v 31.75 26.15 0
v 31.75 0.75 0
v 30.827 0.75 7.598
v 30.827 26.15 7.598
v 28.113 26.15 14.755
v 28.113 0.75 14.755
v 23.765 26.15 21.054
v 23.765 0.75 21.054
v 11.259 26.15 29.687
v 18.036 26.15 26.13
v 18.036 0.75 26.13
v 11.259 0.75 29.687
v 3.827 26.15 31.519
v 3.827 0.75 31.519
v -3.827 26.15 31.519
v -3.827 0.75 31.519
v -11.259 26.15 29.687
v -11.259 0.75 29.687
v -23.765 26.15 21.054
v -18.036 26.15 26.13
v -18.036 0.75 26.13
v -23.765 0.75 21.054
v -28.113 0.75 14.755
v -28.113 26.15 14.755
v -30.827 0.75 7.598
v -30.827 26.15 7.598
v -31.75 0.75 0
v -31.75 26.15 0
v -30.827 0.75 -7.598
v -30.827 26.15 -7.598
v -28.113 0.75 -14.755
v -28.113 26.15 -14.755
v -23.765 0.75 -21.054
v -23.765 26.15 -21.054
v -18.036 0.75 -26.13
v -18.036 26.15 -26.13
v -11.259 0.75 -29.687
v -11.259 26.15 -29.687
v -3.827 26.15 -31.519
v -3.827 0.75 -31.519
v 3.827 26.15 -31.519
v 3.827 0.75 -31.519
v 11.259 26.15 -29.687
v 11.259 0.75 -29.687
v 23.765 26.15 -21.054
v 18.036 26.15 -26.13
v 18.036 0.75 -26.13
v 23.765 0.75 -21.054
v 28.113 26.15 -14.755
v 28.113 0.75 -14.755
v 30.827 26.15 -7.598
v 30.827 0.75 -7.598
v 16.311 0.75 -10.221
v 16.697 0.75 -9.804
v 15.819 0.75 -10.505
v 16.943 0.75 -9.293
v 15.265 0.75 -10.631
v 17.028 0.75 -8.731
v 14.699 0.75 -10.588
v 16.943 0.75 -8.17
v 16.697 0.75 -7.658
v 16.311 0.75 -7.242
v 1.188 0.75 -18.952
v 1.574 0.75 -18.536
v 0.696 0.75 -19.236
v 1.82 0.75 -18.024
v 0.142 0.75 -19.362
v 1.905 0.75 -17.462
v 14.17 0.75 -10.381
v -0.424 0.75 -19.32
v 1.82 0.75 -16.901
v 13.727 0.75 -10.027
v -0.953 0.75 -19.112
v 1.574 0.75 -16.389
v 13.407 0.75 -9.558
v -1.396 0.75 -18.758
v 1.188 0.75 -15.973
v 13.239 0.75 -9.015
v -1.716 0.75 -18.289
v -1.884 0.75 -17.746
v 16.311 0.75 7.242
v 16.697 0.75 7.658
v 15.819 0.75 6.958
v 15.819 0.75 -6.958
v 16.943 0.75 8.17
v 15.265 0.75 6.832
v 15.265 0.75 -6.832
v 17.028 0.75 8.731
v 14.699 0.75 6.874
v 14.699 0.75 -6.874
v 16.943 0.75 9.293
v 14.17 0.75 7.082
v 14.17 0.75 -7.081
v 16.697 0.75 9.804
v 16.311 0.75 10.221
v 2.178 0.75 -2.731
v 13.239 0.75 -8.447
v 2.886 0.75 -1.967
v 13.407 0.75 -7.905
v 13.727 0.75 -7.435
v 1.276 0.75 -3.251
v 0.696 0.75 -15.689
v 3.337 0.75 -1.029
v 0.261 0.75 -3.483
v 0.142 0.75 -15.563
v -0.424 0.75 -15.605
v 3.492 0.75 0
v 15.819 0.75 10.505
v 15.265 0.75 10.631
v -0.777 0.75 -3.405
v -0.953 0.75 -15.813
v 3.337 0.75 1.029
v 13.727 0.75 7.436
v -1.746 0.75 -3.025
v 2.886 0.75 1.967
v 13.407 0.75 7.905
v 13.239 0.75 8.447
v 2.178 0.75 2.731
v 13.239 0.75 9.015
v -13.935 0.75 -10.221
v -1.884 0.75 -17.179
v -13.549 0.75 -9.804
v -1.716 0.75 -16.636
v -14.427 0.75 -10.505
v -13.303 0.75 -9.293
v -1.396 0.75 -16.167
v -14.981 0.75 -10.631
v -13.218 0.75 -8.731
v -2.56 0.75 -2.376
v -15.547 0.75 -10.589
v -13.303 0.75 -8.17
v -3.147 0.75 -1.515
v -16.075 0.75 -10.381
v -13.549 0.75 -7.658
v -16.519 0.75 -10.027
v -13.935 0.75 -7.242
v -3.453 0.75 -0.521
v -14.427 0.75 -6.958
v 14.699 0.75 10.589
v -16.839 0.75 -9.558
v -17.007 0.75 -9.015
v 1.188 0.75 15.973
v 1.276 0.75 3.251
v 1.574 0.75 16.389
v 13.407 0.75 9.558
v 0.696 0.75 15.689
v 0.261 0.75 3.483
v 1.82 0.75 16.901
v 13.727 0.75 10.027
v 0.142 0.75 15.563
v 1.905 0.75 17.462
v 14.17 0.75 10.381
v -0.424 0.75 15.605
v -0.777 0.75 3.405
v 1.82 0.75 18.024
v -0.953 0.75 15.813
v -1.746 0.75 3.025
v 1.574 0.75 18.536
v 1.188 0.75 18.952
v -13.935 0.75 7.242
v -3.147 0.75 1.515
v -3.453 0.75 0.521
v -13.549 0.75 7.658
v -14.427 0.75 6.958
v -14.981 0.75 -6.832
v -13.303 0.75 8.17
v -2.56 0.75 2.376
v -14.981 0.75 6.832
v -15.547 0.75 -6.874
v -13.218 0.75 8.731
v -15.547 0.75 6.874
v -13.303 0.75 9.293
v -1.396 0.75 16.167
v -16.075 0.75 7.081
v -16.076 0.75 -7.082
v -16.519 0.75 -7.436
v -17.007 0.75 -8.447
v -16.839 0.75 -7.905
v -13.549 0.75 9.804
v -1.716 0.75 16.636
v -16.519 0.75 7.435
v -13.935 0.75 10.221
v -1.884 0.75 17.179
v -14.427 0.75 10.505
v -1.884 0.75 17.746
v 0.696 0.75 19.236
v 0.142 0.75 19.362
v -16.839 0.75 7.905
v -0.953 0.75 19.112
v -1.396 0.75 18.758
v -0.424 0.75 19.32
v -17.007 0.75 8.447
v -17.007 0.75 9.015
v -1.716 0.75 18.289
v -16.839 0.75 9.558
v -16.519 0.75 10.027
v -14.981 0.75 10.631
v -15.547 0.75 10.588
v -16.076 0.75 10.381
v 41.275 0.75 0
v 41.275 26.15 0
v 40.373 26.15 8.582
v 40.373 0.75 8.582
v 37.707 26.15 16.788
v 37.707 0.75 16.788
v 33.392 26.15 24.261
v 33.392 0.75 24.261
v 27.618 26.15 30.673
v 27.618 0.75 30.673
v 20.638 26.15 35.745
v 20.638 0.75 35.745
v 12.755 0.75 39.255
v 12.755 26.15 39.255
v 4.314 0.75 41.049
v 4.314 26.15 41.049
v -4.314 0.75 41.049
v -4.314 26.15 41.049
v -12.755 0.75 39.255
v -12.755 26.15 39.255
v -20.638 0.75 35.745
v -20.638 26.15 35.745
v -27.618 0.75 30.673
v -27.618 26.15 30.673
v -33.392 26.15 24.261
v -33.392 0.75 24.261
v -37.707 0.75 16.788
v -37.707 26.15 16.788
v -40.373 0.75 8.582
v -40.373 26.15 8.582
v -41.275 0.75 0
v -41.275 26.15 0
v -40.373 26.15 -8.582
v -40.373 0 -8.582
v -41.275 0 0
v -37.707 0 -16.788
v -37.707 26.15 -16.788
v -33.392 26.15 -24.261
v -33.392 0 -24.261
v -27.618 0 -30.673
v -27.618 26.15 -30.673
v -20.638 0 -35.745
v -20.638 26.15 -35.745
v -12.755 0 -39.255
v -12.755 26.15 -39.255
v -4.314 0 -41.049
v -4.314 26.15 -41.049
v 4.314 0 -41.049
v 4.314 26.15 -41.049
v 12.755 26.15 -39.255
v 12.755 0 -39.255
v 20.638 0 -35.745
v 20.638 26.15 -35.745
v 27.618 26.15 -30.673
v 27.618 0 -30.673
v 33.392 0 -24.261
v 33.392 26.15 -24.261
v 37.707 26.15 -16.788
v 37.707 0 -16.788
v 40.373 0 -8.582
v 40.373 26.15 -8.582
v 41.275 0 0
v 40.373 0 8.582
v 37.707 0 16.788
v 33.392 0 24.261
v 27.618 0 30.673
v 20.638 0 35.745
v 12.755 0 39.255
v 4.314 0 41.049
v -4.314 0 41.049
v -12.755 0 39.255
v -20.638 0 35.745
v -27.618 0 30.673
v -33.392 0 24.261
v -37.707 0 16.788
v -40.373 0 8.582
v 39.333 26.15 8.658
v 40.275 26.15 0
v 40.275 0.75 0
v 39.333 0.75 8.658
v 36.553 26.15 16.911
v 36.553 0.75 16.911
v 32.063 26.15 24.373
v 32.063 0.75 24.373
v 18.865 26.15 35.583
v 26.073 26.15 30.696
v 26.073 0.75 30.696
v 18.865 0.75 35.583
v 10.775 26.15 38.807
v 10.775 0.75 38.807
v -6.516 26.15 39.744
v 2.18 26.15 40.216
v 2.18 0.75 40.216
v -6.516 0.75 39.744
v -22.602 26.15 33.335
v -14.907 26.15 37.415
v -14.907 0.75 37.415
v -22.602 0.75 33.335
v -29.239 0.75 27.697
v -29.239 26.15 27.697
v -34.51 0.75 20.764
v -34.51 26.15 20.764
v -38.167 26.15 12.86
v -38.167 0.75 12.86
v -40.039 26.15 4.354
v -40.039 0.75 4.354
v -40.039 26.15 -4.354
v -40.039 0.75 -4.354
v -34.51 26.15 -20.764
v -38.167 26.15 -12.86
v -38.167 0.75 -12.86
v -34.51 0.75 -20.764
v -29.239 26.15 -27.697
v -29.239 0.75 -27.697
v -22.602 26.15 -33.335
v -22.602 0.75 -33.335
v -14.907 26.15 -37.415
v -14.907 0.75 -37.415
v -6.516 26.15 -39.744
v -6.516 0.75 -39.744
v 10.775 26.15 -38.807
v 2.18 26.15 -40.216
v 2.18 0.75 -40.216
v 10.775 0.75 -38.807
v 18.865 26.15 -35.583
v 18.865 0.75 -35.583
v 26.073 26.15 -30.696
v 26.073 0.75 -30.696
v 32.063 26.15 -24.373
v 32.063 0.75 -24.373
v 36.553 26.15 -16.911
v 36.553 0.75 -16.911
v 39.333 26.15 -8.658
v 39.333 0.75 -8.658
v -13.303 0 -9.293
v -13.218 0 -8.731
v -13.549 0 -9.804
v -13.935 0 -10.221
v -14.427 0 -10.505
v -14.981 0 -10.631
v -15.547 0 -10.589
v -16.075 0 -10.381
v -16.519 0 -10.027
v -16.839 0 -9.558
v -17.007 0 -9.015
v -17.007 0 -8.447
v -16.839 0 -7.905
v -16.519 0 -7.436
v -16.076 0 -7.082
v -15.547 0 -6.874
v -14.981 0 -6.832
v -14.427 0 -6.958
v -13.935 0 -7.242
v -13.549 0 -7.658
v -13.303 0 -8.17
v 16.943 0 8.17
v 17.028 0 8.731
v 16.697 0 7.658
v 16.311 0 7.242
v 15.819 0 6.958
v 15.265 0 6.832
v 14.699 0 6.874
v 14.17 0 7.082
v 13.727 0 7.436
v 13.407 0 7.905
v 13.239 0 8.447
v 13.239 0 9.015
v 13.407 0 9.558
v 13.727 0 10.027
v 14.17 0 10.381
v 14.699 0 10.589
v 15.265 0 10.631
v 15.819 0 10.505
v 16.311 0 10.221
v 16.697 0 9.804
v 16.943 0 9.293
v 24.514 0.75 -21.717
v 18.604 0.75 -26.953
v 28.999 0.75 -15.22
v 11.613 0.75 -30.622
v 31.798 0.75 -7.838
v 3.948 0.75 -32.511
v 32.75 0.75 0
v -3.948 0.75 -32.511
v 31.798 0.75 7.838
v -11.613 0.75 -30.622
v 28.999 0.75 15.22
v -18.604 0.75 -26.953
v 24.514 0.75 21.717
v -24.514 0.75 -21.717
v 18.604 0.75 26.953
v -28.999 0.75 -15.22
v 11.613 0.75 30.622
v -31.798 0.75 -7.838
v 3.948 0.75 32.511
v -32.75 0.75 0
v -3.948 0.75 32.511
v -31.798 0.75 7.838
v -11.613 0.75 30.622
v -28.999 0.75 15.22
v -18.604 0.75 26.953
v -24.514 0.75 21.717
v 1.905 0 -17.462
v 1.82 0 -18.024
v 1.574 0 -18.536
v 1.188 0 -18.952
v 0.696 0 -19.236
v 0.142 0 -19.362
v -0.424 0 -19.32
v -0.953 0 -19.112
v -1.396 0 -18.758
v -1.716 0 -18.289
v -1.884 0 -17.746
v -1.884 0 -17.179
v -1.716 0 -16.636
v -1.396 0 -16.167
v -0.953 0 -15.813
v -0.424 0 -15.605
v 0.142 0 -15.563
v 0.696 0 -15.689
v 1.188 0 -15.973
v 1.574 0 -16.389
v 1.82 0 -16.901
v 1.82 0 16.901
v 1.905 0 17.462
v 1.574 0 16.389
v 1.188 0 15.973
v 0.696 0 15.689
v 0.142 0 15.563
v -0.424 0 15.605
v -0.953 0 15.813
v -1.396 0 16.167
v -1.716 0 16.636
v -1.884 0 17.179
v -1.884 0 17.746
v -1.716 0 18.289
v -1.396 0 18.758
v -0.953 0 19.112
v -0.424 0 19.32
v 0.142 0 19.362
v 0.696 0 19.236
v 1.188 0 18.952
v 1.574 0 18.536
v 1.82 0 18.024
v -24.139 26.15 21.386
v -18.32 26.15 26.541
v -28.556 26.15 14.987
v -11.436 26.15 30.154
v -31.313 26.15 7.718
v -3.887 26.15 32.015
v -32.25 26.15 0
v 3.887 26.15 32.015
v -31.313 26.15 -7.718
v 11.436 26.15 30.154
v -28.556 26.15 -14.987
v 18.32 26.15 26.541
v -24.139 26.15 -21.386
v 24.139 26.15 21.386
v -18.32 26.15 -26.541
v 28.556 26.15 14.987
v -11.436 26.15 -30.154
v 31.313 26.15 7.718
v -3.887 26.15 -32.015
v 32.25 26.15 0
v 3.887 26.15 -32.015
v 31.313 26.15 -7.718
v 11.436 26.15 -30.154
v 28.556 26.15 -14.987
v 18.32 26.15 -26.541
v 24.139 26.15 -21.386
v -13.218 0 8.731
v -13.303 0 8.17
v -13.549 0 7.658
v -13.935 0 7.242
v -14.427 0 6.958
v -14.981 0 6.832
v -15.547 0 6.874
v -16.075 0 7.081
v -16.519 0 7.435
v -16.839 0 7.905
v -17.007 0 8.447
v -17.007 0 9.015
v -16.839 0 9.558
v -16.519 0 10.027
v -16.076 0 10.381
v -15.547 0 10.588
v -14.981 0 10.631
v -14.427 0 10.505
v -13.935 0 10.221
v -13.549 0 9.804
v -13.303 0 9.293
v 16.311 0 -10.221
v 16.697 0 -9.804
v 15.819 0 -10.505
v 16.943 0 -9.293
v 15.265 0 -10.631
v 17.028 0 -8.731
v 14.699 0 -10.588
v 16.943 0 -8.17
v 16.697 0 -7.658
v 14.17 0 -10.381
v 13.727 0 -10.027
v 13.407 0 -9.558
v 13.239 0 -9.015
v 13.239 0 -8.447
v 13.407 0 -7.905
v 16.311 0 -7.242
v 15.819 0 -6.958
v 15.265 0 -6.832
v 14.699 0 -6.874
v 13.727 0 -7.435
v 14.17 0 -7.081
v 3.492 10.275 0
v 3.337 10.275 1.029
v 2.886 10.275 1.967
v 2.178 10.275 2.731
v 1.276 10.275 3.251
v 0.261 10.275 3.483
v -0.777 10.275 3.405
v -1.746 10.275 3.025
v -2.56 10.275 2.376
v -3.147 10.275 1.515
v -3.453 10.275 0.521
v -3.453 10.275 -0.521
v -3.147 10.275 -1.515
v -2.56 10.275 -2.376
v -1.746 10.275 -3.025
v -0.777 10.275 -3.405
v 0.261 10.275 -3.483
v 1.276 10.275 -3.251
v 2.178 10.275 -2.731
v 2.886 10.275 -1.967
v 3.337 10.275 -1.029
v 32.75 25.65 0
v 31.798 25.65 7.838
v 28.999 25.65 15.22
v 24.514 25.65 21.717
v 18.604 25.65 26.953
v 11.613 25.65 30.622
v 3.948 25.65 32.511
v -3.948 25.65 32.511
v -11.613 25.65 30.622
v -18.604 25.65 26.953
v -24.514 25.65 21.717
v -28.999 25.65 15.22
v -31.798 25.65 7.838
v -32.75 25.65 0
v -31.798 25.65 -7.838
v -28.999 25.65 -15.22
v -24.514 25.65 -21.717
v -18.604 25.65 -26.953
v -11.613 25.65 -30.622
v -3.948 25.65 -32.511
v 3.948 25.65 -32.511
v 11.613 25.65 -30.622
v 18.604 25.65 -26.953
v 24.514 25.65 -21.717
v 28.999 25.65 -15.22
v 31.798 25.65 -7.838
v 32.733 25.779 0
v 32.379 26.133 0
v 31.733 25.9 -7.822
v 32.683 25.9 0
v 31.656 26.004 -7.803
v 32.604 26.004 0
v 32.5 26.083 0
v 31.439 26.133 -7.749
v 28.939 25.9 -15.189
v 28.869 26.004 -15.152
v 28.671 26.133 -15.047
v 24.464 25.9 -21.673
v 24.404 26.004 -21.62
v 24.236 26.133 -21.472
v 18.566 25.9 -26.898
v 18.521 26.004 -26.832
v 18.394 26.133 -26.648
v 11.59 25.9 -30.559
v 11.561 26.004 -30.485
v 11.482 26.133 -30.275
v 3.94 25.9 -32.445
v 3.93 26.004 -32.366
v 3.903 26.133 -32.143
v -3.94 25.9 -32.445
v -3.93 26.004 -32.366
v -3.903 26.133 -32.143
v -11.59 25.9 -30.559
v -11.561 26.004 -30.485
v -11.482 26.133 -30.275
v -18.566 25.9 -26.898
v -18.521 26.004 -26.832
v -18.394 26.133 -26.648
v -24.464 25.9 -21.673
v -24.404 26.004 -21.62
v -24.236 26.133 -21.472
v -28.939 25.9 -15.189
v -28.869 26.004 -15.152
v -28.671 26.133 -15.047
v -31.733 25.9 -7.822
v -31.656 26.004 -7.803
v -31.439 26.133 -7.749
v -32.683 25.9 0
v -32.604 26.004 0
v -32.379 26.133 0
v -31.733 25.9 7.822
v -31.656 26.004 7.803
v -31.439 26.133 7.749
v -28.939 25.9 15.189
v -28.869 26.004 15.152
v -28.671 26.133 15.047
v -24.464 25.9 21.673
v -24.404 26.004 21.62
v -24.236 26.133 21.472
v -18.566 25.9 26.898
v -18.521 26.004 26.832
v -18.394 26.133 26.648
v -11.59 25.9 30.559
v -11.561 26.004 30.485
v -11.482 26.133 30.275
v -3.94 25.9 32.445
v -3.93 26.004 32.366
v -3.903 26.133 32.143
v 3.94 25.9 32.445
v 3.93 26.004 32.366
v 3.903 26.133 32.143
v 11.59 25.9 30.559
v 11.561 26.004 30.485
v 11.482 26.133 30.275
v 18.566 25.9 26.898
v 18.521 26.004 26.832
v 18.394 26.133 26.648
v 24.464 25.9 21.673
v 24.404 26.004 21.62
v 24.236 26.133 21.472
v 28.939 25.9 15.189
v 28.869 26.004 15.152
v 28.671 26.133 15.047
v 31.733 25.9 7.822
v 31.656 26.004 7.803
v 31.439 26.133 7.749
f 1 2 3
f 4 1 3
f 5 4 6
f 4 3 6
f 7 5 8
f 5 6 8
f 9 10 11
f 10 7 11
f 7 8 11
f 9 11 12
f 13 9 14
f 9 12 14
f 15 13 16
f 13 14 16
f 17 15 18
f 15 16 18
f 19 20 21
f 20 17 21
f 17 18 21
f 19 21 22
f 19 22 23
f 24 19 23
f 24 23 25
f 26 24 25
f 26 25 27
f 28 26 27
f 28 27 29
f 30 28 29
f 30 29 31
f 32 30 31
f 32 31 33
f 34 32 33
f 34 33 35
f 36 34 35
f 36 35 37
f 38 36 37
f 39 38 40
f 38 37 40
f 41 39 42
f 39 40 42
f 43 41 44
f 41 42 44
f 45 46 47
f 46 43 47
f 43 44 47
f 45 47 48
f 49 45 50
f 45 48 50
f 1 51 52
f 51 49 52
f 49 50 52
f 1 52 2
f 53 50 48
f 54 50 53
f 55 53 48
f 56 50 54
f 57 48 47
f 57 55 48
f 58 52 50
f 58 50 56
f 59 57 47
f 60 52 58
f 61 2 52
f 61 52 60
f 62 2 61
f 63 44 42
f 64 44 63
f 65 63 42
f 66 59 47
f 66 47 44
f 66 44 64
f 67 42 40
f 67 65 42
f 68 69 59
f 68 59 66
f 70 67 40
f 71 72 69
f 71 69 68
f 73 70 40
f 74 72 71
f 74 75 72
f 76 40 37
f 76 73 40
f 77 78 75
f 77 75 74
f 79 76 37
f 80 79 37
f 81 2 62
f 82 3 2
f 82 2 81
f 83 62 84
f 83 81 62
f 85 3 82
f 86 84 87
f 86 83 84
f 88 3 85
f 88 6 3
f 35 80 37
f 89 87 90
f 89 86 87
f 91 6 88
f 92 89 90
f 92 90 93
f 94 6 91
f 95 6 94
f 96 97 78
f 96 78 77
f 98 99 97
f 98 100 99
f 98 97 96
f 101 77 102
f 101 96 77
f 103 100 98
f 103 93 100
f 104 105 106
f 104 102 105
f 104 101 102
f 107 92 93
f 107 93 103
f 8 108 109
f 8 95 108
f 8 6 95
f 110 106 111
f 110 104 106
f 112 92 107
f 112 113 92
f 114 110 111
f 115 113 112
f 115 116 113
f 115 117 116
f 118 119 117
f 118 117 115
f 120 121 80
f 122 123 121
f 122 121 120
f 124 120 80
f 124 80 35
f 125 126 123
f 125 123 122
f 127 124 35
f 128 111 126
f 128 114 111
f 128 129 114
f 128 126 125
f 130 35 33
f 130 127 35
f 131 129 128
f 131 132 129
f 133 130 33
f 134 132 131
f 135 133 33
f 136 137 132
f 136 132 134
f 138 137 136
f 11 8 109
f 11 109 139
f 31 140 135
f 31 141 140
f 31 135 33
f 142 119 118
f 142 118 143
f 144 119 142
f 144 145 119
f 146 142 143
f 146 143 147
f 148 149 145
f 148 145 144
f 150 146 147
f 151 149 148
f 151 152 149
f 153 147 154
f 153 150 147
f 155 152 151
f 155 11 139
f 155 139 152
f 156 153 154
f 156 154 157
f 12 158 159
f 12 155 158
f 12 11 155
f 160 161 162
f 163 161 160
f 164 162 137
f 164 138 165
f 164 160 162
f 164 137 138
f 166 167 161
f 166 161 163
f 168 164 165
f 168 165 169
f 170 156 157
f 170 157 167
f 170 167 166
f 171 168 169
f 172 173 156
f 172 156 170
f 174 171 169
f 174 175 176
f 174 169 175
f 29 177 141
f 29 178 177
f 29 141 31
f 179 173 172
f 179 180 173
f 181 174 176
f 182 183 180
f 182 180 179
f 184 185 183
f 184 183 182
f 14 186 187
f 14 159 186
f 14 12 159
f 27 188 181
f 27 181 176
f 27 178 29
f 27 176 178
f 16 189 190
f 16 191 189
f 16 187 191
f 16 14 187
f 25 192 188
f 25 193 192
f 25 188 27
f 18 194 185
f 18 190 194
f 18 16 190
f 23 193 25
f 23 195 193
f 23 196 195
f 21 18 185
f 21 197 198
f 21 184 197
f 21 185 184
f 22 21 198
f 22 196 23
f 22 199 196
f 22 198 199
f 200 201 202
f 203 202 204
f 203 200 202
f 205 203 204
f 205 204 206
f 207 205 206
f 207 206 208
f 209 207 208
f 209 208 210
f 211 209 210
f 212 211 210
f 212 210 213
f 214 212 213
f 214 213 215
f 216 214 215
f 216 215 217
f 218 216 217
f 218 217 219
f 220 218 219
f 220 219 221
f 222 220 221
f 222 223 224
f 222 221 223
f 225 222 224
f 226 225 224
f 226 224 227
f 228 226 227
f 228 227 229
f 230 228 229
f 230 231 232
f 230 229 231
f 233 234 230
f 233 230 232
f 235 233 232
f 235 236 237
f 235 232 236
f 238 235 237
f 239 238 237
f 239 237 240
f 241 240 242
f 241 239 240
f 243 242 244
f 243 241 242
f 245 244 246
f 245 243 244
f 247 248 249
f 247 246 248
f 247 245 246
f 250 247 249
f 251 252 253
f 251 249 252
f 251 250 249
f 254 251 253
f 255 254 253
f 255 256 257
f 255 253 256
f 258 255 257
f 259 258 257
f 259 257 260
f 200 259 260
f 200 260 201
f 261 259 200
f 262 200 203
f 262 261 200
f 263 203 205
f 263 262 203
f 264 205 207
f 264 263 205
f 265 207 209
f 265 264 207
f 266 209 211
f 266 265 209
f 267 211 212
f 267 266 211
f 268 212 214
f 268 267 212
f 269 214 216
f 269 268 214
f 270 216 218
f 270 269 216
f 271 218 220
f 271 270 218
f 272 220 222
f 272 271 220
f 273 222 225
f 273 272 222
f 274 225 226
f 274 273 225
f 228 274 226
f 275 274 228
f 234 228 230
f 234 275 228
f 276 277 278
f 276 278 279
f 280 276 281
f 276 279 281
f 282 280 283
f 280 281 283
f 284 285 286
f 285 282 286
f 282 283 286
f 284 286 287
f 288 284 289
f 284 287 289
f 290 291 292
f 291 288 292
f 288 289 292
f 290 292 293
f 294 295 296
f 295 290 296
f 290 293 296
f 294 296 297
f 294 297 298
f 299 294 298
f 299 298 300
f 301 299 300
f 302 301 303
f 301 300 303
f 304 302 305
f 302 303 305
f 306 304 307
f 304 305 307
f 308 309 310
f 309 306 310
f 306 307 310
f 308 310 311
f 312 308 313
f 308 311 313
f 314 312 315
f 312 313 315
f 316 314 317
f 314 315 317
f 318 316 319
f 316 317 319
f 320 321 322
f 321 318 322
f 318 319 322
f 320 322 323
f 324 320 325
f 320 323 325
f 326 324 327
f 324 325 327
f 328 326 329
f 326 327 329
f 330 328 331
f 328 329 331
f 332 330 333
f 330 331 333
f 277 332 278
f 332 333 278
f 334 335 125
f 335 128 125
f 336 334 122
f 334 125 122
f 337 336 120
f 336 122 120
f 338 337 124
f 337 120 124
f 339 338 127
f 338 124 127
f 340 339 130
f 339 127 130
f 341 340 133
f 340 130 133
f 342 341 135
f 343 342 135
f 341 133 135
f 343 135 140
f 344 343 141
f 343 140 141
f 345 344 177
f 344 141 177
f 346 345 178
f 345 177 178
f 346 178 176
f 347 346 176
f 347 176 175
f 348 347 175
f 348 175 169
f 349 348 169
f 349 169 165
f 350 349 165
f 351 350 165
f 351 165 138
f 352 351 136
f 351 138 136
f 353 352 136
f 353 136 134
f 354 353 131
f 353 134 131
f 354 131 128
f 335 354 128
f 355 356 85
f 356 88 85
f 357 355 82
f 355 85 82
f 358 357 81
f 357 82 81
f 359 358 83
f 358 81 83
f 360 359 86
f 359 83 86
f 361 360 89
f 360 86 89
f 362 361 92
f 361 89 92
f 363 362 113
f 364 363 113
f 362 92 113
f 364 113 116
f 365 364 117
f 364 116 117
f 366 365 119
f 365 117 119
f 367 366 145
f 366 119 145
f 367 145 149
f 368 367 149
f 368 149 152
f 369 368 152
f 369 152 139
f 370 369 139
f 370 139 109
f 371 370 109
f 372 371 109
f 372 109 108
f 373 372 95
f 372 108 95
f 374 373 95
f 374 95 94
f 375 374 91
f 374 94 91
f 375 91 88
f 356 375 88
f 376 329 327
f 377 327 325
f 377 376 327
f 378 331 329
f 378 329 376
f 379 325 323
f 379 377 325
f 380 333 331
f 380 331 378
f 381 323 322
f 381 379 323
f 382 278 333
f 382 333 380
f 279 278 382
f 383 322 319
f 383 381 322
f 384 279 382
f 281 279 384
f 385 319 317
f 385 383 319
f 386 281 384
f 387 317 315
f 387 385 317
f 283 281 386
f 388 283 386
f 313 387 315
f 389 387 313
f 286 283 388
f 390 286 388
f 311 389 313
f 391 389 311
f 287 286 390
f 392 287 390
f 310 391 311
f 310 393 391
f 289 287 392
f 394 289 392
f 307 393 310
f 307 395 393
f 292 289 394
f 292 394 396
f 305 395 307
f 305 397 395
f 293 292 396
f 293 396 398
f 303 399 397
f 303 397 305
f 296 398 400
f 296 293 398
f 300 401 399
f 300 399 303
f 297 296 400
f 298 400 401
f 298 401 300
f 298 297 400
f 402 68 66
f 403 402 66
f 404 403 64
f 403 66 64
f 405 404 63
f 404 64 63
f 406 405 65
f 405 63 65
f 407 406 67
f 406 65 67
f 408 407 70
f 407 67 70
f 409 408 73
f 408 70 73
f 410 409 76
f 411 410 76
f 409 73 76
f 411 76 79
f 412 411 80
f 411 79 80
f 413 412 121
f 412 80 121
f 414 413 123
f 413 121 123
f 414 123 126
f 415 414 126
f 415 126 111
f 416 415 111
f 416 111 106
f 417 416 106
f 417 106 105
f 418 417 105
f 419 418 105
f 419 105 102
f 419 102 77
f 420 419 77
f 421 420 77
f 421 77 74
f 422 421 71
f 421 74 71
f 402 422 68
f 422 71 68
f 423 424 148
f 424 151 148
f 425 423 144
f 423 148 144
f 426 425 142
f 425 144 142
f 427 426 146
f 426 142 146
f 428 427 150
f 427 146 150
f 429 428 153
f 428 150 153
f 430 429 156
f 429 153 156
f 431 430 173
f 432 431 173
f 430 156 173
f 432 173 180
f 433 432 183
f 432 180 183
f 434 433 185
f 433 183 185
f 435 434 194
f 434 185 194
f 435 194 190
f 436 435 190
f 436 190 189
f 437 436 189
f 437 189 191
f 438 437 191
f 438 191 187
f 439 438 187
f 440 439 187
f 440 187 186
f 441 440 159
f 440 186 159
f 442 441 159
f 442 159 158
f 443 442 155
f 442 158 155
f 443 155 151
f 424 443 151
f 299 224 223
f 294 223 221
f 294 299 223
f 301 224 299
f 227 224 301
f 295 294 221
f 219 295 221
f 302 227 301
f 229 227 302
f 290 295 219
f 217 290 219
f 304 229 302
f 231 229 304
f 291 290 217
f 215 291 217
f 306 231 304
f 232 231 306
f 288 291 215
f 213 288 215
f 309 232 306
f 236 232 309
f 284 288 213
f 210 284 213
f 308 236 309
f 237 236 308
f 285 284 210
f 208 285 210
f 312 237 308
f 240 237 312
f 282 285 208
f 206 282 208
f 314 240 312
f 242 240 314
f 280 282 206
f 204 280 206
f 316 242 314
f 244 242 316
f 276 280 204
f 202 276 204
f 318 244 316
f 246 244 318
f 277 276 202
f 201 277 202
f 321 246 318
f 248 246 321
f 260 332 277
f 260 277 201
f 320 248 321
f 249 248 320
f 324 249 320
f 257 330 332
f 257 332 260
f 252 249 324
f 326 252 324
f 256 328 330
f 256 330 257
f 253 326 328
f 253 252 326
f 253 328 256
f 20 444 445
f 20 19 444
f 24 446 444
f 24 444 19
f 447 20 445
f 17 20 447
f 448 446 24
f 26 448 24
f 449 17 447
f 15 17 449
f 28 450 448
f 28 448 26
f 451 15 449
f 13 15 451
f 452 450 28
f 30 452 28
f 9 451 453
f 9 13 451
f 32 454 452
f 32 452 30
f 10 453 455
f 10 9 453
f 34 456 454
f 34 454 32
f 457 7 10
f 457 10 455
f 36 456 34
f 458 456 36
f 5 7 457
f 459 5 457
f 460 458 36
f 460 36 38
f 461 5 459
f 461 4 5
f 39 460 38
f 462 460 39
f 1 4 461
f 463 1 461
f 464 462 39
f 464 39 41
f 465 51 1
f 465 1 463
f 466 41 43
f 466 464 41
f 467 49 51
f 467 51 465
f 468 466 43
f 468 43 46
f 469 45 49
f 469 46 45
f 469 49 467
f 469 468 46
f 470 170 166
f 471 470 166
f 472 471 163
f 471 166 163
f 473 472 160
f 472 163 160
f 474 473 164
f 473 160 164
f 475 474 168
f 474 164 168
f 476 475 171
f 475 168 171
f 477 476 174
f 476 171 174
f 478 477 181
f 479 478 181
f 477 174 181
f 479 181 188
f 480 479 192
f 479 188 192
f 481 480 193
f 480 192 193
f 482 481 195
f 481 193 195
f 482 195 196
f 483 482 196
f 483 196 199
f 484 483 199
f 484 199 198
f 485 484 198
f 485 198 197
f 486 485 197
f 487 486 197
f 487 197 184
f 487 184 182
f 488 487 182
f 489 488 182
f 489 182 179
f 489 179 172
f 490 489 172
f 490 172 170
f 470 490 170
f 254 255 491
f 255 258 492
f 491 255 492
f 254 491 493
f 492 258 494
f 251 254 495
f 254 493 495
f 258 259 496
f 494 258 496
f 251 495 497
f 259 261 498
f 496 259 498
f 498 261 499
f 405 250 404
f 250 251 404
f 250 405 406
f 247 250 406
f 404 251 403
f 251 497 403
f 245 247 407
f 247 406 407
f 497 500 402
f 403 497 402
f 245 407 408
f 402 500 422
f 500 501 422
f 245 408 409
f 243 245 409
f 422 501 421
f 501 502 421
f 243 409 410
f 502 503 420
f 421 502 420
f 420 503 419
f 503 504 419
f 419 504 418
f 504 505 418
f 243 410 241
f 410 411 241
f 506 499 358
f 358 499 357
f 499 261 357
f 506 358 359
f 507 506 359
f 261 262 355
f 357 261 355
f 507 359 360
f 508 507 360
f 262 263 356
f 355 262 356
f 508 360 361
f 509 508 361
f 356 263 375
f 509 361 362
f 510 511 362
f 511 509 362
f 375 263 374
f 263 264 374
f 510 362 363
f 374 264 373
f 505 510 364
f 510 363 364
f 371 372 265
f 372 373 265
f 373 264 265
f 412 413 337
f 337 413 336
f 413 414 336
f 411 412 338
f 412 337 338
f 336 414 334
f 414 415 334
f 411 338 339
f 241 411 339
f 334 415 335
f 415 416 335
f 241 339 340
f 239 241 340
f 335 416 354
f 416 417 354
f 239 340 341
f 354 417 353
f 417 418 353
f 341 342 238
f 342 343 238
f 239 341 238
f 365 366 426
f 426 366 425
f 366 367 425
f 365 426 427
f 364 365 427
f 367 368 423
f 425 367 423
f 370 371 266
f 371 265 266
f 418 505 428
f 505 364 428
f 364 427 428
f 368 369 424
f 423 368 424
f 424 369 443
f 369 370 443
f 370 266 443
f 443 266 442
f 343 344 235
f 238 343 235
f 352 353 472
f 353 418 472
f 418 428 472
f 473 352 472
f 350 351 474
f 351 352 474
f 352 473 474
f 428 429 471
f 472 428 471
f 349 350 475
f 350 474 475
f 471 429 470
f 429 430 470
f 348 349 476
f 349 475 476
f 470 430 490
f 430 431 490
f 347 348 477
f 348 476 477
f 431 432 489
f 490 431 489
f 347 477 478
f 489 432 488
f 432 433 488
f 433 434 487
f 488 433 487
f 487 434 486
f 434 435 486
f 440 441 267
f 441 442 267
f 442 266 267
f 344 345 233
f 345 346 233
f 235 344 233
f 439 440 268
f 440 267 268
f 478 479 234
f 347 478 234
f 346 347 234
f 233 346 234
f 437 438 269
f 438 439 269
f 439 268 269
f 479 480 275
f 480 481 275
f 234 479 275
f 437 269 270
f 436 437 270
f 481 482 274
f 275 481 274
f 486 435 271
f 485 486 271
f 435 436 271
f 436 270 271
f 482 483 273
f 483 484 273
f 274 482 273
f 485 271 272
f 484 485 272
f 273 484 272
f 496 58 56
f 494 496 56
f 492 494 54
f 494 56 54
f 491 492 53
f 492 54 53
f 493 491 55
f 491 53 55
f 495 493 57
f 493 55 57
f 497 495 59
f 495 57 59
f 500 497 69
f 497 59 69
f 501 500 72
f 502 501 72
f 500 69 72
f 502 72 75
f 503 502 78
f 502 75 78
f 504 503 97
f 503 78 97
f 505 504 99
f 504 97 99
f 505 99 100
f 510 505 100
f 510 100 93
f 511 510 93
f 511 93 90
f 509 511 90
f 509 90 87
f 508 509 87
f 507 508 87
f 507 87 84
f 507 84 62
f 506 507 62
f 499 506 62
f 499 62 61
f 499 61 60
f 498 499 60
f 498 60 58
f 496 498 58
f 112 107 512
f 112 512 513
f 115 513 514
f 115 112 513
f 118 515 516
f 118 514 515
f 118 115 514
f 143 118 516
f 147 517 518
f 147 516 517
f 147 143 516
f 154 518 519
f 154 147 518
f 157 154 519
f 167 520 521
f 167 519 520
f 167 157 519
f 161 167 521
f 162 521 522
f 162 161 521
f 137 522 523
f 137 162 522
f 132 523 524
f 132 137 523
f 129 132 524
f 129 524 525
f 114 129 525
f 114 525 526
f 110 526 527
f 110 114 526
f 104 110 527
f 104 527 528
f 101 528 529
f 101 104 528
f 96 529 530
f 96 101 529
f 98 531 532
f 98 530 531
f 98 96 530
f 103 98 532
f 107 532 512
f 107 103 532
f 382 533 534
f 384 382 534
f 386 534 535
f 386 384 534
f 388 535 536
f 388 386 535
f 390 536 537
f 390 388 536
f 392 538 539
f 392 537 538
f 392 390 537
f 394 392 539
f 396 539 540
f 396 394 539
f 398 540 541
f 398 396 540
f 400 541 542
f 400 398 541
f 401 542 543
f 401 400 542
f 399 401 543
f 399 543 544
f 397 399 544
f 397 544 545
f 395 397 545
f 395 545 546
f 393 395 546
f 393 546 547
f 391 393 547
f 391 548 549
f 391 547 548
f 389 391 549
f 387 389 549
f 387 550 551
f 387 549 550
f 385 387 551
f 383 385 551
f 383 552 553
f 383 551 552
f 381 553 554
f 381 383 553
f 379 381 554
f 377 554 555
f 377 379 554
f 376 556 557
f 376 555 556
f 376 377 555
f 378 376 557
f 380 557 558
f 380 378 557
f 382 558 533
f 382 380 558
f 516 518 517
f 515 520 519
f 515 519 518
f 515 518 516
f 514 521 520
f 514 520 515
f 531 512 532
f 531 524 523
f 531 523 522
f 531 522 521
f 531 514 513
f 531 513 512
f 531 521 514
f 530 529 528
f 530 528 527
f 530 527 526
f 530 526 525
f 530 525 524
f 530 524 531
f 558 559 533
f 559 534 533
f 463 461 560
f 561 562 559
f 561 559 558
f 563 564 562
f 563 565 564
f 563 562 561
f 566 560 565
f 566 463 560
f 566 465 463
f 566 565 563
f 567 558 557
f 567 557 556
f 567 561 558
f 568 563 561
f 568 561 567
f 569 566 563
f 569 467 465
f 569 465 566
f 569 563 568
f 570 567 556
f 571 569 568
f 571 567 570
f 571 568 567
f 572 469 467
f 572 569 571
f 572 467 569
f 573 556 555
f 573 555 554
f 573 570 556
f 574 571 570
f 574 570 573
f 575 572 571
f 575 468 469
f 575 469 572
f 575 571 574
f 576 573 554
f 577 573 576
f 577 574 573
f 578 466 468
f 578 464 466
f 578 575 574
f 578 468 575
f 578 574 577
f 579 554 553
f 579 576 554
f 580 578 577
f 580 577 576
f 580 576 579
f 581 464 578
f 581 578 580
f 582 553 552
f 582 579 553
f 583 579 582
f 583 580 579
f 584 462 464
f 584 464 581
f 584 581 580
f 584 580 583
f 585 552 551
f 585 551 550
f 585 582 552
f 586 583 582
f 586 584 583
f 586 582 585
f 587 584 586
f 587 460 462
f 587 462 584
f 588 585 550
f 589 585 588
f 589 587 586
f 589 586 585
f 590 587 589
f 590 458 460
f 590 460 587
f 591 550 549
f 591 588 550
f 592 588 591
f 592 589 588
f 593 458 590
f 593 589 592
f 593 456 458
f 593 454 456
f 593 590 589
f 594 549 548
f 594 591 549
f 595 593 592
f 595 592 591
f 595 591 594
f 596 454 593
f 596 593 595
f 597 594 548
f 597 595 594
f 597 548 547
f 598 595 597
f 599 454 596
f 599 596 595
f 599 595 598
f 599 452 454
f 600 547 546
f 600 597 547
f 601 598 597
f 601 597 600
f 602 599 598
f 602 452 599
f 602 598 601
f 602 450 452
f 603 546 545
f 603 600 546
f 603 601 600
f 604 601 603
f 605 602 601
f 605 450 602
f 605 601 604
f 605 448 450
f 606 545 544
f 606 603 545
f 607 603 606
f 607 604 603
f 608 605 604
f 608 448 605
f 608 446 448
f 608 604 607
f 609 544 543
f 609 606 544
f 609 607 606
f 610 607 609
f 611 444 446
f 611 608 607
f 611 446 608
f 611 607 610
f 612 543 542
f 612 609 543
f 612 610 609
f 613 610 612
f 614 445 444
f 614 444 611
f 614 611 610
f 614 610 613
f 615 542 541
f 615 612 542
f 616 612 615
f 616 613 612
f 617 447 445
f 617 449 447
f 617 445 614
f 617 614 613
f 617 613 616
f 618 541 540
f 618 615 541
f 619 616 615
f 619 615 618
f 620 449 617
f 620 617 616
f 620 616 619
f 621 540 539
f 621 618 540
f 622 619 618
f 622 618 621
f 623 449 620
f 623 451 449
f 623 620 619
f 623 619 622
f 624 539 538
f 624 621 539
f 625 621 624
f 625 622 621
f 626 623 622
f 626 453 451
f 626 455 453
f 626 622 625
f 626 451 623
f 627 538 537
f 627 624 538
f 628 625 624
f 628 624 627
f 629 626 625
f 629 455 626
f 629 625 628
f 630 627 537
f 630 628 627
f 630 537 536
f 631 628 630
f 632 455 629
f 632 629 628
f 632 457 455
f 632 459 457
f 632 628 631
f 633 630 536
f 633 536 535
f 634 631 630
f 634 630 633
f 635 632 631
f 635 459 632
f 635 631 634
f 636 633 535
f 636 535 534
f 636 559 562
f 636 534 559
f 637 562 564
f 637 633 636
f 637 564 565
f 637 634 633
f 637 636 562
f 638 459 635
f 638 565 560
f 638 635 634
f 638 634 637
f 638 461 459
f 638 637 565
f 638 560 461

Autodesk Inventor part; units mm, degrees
ref_plane "YZ Plane" through (0, 0, 0) normal (1, 0, 0) x (0, 1, 0)
ref_plane "XZ Plane" through (0, 0, 0) normal (0, 1, 0) x (-1, 0, 0)
ref_plane "XY Plane" through (0, 0, 0) normal (0, 0, 1) x (1, 0, 0)
sketch "Sketch1" plane through (0, 0, 0) normal (0, 1, 0) x (-1, 0, 0)
  circle A0 centre (0, 0) radius 41.275
  dimension "d0" = 82.55
extrude "Extrusion1" add sketch "Sketch1" along normal blind 0.75
sketch "Sketch2" plane through (0, 0.75, 0) normal (0, 1, 0) x (1, 0, 0)
  circle A0 centre (0, 0) radius 31.75
  circle A1 centre (0, 0) radius 41.275 projected
  circle A2 centre (0, 0) radius 32.75
  circle A3 centre (0, 0) radius 40.275
  dimension "d3" = 63.5
  dimension "d4" = 1
  dimension "d5" = 1
extrude "Extrusion2" add sketch "Sketch2" along normal blind 25.4
fillet "Fillet1" radius 0.5 1 edges at (-32.75, 26.15, 0)
sketch "Sketch3" plane through (0, 0.75, 0) normal (0, 1, 0) x (1, 0, 0)
  circle A0 centre (0, 0) radius 17.4625 construction
  line L0 (0, 0) -> (0, -17.4625) construction
  circle A1 centre (0, -17.4625) radius 1.905
  circle A2 centre (15.123, -8.7313) radius 1.905
  circle A3 centre (15.123, 8.7312) radius 1.905
  circle A4 centre (0, 17.4625) radius 1.905
  circle A5 centre (-15.123, 8.7313) radius 1.905
  circle A6 centre (-15.123, -8.7312) radius 1.905
  dimension "d9" = 34.925
  dimension "d10" = 3.81
  dimension "d13" = 360
extrude "Extrusion3" cut sketch "Sketch3" against normal through all
sketch "Sketch4" plane through (0, 0.75, 0) normal (0, 1, 0) x (1, 0, 0)
  circle A0 centre (0, 0) radius 3.4925
  dimension "d17" = 6.985
extrude "Extrusion4" add sketch "Sketch4" along normal blind 9.525
properties part number "Mold - Wheel"
